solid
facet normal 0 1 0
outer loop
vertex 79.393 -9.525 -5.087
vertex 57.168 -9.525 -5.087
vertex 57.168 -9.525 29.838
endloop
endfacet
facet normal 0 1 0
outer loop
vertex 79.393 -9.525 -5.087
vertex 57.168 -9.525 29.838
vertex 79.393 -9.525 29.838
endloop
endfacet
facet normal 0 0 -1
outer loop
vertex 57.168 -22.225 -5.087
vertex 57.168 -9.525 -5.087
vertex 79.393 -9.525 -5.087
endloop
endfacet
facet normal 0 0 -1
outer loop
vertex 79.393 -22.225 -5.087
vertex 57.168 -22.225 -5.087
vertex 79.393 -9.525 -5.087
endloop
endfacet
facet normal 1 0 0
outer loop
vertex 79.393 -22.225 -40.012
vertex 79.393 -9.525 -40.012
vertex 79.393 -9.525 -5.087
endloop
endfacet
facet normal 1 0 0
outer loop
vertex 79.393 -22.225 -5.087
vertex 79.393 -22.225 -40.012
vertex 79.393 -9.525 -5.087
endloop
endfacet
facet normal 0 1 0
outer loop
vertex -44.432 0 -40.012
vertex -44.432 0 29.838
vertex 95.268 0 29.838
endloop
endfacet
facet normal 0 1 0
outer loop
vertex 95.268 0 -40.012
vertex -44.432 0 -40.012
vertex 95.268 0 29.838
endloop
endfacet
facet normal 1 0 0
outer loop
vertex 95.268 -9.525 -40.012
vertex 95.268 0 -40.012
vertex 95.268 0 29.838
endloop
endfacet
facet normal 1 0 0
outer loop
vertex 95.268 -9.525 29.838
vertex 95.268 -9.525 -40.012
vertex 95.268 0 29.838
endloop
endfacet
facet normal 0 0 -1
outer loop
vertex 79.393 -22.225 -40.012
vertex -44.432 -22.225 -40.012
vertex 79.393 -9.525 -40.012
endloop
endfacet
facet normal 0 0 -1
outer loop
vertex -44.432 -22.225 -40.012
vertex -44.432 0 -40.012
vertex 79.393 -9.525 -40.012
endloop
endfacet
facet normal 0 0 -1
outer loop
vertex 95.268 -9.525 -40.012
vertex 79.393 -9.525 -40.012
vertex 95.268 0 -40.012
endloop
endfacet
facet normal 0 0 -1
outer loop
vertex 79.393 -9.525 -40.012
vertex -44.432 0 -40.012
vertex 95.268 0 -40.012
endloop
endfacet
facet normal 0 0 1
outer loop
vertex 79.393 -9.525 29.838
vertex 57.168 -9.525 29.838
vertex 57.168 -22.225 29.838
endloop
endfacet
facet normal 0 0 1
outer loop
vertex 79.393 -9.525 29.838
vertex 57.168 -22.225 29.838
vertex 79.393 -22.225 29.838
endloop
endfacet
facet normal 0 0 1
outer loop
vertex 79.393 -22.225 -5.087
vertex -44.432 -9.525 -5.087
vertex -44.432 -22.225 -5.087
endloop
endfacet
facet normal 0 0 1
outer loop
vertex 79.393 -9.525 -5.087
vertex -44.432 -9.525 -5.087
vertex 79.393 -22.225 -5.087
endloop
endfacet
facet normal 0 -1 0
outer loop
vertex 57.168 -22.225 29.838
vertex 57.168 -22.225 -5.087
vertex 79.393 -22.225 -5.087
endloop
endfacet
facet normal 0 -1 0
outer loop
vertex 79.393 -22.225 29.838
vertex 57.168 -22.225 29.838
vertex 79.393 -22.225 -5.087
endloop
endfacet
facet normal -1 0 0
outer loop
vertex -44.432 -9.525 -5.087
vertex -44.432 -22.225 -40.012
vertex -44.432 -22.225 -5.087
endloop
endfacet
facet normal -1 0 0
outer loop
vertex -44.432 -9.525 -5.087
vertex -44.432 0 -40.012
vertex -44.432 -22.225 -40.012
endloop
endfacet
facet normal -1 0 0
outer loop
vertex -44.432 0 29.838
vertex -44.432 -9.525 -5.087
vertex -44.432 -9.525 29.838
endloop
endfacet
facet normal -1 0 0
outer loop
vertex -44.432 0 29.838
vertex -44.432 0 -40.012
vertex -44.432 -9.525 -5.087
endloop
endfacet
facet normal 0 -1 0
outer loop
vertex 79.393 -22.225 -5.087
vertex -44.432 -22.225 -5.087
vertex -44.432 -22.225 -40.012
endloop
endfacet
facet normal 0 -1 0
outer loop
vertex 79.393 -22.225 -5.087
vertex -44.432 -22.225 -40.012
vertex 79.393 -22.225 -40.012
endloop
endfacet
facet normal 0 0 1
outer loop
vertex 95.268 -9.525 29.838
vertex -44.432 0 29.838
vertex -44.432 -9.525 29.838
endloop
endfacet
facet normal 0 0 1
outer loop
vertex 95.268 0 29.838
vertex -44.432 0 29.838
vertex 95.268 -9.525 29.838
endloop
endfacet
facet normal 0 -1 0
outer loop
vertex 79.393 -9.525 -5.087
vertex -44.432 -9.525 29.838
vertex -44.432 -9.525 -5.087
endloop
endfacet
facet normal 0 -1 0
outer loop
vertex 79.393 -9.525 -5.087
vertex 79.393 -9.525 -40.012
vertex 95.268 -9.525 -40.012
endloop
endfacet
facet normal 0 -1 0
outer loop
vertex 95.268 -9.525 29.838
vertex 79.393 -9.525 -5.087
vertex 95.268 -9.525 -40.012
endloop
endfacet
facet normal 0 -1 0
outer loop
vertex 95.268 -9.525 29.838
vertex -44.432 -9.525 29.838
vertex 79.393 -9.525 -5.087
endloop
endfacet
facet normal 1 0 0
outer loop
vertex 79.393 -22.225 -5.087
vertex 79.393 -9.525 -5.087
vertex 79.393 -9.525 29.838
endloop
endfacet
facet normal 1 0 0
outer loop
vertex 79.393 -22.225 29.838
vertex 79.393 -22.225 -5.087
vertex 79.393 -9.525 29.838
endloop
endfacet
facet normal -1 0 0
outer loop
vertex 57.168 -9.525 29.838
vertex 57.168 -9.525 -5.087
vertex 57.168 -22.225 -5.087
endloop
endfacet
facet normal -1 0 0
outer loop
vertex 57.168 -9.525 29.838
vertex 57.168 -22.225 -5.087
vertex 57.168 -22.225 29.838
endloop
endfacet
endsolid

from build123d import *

# Parameters (mm, degrees)
F0_W     = 139.7
F0_H     = 69.85
F1_DEPTH = 9.525
F2_W     = 123.825
F2_H     = 34.925
F3_DEPTH = 12.7
F4_W     = 22.225
F4_H     = 34.925
F5_DEPTH = 12.7


with BuildPart() as f1:
    # F0 (on Front) → F1 (new body)
    with BuildSketch(Plane.XZ):
        with Locations((25.417753, -5.086776)):
            Rectangle(F0_W, F0_H)
    extrude(amount=F1_DEPTH)

    # F2 (on face) → F3 (join)
    with BuildSketch(Plane.XZ.offset(9.525)):
        with Locations((17.480253, -22.549276)):
            Rectangle(F2_W, F2_H)
    extrude(amount=F3_DEPTH)


with BuildPart() as f5:
    # F4 (on face) → F5 (new body)
    with BuildSketch(Plane.XZ.offset(9.525)):
        with Locations((68.280253, 12.375724)):
            Rectangle(F4_W, F4_H)
    extrude(amount=F5_DEPTH)


solid = Compound([f1.part, f5.part])
